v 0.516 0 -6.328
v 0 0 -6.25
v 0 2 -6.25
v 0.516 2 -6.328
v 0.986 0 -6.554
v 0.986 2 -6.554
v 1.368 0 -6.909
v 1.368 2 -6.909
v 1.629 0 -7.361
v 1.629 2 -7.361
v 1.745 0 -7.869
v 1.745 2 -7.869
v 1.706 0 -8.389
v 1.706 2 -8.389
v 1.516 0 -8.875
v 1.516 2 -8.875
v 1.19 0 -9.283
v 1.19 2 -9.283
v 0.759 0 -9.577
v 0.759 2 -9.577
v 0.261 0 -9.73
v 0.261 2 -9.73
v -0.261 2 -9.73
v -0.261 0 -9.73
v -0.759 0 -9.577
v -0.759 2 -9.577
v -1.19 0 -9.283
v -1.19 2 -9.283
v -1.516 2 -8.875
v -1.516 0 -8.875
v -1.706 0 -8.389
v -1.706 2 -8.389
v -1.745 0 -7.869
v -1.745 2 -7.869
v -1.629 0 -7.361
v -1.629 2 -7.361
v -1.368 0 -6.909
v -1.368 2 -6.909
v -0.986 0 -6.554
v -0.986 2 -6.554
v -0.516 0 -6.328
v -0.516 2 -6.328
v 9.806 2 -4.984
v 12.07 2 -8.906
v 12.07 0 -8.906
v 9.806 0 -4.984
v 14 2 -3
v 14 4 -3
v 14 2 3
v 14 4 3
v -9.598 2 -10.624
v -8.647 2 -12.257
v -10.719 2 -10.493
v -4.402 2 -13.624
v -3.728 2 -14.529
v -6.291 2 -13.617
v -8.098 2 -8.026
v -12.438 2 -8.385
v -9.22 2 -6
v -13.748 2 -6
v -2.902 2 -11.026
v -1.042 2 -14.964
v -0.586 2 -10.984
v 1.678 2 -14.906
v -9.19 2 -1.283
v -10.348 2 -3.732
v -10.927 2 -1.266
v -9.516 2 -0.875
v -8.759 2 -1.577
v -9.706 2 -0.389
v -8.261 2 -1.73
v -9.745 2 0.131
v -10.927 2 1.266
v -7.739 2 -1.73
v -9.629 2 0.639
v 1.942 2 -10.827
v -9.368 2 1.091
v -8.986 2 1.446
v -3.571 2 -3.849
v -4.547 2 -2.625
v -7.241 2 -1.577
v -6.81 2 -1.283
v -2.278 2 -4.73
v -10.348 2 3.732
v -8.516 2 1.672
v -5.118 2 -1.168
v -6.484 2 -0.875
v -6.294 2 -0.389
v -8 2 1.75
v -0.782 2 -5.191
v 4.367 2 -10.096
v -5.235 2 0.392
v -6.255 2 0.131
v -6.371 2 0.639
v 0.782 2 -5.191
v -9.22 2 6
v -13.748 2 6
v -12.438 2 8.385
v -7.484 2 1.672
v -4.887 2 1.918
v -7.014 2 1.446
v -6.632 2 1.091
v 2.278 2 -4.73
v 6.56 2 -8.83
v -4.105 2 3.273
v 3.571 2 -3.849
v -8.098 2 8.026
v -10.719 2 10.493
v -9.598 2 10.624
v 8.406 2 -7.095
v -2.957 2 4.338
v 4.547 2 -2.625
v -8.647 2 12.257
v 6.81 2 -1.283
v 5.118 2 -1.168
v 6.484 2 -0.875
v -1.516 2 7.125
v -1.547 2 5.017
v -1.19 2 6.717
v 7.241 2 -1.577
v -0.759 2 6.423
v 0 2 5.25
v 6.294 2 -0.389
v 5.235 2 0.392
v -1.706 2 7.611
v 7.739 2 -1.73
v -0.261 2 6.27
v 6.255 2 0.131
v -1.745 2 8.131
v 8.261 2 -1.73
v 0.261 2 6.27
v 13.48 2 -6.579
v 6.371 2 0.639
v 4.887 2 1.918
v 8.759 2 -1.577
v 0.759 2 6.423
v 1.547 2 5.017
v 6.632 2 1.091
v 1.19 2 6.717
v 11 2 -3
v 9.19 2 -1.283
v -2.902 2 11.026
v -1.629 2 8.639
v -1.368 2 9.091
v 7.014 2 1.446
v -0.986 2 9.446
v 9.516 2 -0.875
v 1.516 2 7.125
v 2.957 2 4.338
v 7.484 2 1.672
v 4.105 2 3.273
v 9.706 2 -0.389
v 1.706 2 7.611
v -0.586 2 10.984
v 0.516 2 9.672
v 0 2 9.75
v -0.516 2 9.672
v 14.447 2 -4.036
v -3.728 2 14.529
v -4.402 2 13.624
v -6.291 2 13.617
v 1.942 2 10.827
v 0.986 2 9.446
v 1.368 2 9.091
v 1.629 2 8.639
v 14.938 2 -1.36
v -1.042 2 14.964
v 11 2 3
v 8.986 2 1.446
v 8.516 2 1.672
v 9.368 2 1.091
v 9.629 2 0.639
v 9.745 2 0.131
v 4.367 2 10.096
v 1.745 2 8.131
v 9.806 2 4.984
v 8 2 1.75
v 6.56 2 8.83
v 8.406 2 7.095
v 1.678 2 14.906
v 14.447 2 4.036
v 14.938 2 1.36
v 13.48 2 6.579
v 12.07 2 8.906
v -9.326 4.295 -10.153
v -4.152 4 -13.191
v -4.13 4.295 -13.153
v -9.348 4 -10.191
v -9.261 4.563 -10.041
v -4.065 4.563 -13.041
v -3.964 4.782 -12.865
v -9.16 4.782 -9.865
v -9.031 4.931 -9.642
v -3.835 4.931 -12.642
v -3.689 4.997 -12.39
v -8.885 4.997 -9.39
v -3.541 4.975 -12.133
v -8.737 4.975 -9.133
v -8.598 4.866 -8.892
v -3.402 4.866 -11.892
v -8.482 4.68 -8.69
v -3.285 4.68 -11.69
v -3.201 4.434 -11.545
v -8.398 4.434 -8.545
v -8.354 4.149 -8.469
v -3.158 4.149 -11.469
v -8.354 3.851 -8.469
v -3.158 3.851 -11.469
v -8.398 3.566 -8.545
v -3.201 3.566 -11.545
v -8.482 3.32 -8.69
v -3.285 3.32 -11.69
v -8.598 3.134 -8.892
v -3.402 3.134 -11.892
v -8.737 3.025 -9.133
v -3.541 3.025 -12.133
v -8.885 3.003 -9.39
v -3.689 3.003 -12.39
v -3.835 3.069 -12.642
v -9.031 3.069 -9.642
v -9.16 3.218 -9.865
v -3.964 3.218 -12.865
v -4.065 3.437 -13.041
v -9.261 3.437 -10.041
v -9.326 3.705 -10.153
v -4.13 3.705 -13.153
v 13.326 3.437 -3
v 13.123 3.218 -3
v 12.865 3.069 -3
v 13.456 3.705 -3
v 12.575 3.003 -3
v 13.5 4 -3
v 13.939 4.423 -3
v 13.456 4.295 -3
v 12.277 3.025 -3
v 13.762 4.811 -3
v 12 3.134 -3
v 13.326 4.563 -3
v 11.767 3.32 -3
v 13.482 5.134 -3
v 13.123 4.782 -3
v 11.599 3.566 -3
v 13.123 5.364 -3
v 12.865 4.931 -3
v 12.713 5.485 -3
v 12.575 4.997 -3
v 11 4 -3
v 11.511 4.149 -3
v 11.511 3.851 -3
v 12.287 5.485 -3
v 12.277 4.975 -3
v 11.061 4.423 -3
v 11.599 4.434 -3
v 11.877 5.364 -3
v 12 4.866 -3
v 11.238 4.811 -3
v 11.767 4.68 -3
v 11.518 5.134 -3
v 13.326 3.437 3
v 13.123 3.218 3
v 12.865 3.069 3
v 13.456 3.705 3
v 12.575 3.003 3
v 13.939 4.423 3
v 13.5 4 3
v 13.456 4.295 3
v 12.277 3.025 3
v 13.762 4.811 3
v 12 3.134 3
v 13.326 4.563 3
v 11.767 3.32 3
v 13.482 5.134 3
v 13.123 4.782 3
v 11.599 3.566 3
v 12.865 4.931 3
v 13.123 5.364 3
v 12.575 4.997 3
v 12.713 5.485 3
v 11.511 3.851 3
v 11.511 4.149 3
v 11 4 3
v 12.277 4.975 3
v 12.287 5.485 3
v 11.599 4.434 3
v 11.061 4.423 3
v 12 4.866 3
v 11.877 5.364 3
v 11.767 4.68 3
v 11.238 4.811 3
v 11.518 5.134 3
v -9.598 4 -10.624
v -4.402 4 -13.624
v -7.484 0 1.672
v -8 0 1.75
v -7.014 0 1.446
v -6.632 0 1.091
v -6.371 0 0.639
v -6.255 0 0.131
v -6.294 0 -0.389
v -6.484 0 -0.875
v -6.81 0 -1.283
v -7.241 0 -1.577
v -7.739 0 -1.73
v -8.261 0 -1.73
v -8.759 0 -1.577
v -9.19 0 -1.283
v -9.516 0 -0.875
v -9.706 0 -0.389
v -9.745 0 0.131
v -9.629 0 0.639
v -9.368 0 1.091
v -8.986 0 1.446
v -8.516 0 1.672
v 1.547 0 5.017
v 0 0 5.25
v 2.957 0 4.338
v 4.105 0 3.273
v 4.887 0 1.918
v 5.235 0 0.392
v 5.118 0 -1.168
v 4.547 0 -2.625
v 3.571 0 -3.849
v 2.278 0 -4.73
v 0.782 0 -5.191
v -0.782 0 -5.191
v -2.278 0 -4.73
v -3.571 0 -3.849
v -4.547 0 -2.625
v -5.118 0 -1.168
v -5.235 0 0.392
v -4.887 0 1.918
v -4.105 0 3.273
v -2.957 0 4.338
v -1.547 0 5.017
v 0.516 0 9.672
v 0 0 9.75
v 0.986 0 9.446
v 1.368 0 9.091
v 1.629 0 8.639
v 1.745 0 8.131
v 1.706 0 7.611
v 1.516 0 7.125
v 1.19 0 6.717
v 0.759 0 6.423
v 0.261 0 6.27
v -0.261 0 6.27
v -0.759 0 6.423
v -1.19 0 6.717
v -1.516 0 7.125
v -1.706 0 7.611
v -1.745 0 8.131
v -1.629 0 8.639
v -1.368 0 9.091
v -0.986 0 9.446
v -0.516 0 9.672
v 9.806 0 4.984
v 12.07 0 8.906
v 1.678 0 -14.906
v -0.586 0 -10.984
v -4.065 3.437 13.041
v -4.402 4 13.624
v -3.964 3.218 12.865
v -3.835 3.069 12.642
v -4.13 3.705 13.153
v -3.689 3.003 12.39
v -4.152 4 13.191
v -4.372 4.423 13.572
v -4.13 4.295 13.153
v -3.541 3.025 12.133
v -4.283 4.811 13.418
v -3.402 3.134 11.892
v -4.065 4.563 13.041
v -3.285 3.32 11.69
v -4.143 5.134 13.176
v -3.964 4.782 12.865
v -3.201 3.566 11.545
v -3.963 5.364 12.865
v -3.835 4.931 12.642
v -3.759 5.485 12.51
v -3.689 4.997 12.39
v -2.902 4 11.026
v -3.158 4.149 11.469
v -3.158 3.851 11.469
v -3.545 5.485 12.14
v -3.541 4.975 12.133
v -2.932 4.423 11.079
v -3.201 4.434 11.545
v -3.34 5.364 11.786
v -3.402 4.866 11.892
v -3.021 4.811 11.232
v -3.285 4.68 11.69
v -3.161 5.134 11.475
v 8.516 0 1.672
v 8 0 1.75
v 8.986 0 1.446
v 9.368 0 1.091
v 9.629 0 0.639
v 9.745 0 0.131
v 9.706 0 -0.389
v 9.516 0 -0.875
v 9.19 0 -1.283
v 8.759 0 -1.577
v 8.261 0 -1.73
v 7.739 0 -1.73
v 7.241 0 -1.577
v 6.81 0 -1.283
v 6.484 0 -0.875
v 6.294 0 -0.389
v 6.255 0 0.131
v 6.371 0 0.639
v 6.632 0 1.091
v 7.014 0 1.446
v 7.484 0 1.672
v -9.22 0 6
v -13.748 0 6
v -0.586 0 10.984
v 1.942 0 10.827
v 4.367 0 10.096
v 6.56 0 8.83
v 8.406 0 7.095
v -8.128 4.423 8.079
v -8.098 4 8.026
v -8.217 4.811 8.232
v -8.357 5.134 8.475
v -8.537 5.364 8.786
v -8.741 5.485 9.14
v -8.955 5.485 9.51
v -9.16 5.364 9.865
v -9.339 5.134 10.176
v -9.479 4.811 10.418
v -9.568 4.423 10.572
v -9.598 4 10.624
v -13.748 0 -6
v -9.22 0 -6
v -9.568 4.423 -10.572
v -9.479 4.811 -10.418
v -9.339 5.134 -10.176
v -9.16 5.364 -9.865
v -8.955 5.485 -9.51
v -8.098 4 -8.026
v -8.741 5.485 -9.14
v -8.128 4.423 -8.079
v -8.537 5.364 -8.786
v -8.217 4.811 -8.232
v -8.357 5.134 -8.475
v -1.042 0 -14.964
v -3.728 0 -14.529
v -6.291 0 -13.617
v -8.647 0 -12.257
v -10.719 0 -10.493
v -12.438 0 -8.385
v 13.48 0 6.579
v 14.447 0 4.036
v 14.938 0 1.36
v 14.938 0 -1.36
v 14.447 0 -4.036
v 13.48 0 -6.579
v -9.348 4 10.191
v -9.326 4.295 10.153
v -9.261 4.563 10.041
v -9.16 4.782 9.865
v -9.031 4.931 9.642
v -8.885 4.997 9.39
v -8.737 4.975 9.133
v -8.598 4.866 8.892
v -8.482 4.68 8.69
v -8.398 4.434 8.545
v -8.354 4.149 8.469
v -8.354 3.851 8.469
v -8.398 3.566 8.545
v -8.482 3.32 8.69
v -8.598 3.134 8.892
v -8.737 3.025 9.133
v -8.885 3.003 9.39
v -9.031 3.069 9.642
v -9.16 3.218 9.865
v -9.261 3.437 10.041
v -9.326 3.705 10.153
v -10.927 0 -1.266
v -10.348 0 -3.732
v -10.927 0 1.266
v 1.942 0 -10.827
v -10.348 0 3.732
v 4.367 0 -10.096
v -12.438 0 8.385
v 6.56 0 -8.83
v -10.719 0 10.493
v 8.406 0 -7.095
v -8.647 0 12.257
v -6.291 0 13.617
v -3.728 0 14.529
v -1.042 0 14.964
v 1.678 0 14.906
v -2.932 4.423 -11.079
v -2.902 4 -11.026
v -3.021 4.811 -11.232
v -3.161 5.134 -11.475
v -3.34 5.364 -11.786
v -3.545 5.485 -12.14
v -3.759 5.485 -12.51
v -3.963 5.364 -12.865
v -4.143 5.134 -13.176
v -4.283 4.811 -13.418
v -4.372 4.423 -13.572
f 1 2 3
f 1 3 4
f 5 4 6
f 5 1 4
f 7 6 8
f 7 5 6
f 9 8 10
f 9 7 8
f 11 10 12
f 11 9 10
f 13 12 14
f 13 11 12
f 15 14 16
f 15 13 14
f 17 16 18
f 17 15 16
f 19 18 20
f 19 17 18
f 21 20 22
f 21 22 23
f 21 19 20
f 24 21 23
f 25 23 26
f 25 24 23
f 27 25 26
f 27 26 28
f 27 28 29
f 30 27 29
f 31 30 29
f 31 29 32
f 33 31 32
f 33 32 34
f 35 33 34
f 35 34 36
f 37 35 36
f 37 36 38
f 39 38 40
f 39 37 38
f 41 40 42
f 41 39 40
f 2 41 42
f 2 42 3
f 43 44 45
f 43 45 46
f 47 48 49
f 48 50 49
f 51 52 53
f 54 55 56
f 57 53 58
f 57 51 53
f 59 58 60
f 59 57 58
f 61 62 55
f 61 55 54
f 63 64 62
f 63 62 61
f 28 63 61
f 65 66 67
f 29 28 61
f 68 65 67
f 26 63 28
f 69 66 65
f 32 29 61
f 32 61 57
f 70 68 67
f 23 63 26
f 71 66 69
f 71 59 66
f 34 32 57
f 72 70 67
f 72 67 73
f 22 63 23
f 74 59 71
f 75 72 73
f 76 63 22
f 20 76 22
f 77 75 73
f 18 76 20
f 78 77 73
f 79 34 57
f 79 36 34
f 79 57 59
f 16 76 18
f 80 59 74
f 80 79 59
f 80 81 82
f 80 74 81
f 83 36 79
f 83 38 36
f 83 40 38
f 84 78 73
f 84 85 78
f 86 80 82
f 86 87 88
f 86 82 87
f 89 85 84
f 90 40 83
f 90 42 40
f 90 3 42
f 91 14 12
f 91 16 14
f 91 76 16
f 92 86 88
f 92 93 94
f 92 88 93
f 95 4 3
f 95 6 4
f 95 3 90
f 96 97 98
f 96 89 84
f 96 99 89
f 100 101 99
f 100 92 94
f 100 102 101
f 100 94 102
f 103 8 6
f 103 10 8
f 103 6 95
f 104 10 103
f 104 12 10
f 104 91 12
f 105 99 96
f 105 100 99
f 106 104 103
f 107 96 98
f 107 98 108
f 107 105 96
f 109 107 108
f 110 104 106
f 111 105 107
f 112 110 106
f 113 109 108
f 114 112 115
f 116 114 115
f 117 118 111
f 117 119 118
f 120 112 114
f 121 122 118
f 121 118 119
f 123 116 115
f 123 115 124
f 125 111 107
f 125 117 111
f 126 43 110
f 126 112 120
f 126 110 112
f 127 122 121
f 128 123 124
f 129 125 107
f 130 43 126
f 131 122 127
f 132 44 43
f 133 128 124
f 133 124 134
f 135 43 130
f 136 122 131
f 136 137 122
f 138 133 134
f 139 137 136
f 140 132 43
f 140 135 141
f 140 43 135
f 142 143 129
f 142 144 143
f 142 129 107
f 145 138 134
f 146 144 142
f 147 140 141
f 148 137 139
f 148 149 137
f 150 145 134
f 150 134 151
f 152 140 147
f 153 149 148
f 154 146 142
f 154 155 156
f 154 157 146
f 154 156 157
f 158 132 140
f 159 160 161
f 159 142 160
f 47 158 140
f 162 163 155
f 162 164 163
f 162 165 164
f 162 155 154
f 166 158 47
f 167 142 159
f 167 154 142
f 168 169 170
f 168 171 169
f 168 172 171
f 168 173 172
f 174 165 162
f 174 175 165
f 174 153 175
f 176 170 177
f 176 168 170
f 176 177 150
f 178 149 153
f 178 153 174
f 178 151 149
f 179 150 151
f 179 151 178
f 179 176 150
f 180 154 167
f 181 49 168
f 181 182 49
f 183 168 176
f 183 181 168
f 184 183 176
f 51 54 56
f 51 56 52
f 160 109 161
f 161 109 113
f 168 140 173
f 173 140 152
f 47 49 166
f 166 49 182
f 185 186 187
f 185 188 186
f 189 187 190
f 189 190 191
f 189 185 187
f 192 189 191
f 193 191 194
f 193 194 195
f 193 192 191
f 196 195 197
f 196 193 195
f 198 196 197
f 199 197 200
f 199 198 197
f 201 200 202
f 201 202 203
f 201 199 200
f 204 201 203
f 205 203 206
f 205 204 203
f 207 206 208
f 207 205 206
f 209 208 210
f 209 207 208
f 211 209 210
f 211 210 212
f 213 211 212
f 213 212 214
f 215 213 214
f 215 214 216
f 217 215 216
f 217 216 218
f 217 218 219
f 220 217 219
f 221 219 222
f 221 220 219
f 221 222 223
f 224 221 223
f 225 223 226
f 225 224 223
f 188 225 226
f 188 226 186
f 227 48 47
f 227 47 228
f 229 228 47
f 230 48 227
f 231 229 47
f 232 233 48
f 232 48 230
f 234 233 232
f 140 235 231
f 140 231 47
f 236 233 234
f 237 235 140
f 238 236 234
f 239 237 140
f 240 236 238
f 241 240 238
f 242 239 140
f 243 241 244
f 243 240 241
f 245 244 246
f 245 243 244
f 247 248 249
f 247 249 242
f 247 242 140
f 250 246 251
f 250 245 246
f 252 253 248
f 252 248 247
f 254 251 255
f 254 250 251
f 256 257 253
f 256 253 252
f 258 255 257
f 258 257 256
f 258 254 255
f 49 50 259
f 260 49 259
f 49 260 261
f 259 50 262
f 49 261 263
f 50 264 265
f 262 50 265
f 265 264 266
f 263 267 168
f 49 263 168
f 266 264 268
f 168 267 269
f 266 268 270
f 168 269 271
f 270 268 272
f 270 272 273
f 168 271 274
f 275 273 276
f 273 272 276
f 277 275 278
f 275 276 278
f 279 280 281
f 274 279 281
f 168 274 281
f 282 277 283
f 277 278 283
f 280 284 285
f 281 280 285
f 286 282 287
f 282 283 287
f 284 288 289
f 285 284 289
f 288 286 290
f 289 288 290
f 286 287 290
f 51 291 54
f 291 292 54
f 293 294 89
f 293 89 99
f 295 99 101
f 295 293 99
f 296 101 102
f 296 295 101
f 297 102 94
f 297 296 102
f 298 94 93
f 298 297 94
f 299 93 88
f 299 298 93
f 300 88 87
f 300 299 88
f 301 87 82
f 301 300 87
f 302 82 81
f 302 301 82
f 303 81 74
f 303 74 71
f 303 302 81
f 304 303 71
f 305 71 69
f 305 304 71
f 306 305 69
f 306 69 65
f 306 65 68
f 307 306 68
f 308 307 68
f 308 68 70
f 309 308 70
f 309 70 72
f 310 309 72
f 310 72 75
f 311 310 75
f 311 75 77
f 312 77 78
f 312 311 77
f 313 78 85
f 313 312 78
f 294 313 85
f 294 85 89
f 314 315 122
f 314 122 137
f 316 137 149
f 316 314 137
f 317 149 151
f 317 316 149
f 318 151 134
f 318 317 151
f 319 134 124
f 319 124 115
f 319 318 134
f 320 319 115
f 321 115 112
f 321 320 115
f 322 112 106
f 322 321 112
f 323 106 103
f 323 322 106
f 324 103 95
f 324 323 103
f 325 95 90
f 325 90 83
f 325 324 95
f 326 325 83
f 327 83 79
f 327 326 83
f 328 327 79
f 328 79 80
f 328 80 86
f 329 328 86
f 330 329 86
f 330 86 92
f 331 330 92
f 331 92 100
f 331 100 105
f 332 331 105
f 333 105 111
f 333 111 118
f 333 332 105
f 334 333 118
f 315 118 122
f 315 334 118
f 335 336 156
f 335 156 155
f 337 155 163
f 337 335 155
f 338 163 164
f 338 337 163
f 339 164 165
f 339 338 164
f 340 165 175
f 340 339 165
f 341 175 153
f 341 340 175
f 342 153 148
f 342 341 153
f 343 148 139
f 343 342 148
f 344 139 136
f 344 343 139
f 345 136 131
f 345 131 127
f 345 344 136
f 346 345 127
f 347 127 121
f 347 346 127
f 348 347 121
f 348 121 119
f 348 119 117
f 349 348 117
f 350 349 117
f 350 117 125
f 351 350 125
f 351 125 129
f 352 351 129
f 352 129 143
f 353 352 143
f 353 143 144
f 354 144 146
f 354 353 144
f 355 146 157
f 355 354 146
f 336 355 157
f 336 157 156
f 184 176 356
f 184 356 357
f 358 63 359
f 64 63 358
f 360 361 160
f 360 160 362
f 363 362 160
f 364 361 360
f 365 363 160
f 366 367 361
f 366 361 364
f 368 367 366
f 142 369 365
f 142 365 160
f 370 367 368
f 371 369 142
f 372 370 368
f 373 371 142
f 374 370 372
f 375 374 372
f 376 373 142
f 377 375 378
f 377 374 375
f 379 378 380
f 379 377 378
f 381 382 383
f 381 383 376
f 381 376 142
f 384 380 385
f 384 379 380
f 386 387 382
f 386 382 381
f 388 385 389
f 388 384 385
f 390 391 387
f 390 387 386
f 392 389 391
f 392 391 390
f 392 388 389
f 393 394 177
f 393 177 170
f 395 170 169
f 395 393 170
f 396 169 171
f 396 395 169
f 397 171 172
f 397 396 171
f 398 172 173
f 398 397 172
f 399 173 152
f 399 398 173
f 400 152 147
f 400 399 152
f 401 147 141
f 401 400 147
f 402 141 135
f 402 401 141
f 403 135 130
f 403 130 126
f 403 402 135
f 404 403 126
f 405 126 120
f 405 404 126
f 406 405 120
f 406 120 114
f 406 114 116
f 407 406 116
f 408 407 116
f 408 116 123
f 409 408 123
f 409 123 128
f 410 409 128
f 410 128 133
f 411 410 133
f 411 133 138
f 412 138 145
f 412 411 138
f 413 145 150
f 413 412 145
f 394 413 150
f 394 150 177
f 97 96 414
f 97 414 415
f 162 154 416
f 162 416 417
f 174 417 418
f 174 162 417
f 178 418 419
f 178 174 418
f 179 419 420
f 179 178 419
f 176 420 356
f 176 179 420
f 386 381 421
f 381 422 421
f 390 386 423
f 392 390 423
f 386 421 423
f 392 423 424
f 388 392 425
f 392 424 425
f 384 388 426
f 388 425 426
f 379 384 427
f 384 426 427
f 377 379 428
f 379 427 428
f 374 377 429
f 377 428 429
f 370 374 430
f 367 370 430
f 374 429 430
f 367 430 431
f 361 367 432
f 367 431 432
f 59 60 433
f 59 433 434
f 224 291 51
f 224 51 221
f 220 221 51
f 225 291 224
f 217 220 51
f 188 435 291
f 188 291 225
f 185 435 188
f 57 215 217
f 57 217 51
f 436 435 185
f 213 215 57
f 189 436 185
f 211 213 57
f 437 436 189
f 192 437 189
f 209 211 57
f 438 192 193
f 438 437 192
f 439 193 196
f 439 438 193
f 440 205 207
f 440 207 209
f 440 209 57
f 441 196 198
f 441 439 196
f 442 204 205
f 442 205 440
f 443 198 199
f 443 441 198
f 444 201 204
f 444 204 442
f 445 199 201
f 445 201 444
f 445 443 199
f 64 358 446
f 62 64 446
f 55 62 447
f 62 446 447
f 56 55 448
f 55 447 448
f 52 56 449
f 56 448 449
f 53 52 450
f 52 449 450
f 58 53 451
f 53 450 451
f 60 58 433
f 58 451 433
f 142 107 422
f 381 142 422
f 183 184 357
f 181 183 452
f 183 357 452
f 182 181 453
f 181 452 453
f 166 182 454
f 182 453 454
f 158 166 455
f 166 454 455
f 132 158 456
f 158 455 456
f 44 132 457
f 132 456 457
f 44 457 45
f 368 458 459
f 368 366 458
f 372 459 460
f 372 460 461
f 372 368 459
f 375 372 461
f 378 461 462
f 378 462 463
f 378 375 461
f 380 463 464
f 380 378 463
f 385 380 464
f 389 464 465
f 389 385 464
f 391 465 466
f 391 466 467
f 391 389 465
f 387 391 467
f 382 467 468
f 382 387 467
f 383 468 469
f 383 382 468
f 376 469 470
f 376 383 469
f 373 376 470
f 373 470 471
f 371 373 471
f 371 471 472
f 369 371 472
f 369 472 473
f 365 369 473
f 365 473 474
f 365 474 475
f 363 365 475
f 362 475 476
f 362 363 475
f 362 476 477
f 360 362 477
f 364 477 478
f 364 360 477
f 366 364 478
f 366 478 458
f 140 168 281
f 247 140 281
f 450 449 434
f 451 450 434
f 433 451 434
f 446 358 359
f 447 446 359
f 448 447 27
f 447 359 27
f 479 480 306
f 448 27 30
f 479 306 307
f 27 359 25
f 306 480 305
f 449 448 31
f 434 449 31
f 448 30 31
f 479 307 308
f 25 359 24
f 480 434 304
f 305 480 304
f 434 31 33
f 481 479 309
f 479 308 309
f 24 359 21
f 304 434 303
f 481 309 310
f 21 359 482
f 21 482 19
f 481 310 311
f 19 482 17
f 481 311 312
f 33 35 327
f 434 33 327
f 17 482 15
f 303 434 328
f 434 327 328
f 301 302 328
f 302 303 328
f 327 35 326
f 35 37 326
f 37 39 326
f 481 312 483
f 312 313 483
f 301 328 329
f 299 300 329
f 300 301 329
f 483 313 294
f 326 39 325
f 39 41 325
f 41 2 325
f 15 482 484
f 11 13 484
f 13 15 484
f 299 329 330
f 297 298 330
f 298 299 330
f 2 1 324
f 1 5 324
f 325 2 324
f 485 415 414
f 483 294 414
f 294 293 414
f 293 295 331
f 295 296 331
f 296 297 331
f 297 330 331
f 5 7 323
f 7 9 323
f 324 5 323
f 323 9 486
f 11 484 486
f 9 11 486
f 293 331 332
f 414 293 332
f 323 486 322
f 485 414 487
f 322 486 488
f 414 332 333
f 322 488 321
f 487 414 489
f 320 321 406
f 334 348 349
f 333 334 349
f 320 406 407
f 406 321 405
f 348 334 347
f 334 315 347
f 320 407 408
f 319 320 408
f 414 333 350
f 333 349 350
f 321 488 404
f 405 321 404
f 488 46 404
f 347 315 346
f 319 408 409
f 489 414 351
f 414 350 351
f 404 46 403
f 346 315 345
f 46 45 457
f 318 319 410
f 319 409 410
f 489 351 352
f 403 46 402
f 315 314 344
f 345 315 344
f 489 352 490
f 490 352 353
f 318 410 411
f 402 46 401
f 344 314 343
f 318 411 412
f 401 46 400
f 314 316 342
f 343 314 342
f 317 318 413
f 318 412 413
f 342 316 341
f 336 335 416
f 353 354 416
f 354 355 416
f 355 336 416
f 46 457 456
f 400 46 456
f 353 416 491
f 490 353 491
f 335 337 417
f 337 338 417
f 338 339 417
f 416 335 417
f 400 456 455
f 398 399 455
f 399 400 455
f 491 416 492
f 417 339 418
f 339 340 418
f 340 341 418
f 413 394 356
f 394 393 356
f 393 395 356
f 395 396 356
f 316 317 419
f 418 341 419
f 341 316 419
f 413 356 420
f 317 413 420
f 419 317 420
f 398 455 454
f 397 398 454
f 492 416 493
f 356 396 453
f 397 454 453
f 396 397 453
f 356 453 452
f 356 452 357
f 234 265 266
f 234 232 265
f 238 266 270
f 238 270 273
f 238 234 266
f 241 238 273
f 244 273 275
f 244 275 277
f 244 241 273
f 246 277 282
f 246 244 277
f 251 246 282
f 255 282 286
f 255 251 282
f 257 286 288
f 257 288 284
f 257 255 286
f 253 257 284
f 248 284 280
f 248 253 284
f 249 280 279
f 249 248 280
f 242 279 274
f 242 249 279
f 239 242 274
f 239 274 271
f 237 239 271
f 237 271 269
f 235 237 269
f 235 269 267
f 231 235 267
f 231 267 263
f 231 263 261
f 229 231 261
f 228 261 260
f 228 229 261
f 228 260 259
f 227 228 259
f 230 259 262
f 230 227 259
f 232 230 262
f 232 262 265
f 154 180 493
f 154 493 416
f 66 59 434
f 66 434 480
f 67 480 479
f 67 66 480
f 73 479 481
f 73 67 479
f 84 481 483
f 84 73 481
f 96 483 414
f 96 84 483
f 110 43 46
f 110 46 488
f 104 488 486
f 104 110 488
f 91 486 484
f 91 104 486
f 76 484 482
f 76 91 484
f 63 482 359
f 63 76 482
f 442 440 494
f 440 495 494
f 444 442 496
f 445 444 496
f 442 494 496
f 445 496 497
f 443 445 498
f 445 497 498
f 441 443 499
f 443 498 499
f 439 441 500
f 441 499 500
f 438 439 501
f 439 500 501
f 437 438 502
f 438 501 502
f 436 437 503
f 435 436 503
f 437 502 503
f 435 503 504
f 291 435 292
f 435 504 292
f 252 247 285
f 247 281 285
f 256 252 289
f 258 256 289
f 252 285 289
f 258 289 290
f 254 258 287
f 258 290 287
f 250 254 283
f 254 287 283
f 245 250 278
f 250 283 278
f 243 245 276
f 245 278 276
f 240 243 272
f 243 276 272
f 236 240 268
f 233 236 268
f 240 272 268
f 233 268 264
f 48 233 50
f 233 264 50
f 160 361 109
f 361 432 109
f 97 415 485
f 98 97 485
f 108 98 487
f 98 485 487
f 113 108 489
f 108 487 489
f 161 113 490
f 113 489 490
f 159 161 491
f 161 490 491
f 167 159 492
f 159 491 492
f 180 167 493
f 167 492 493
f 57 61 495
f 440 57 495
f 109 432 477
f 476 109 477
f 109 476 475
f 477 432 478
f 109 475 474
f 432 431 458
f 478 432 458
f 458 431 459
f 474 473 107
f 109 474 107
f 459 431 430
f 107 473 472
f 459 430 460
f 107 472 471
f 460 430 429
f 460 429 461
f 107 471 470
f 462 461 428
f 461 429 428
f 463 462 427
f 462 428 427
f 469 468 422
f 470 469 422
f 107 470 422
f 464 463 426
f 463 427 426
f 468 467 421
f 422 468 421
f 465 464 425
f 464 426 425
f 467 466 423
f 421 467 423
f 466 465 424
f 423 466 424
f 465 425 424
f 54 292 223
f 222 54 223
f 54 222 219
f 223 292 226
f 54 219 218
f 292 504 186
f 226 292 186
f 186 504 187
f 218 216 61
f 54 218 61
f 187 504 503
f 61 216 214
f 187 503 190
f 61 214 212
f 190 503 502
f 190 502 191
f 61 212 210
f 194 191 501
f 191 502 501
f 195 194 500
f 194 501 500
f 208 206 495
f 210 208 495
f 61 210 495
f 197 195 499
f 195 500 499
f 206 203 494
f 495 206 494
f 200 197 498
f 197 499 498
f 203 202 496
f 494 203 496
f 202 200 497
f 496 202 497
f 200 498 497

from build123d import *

# Parameters (mm, degrees)
SKETCH1_R           = 15
SKETCH1_R_2         = 5.25
SKETCH1_R_3         = 1.75
BOSS_EXTRUDE1_DEPTH = 2
SKETCH2_R           = 1
BOSS_EXTRUDE2_DEPTH = 3
CIRPATTERN1_COUNT   = 3
SKETCH3_OUTSIDE_W   = 40.556
SKETCH3_OUTSIDE_H   = 40.556
CUT_EXTRUDE1_DEPTH  = 10


with BuildPart() as part:
    # Sketch1 → Boss-Extrude1 (new body)
    with BuildSketch(Plane(origin=(0, 0, 0), x_dir=(1, 0, 0), z_dir=(0, 1, 0))):
        with Locations(Location((0, 0, 0), (0, 0, 270))):
            Circle(SKETCH1_R)
        with Locations(Location((0, 0, 0), (0, 0, 270))):
            Circle(SKETCH1_R_2, mode=Mode.SUBTRACT)
        with Locations(Location((0, 8, 0), (0, 0, 270))):
            Circle(SKETCH1_R_3, mode=Mode.SUBTRACT)
        with Locations(Location((8, 0, 0), (0, 0, 270))):
            Circle(SKETCH1_R_3, mode=Mode.SUBTRACT)
        with Locations(Location((0, -8, 0), (0, 0, 270))):
            Circle(SKETCH1_R_3, mode=Mode.SUBTRACT)
        with Locations(Location((-8, 0, 0), (0, 0, 270))):
            Circle(SKETCH1_R_3, mode=Mode.SUBTRACT)
    extrude(amount=BOSS_EXTRUDE1_DEPTH)

    # Sketch2 → Boss-Extrude2 (add, symmetric)
    with BuildSketch(Plane.XY):
        with BuildLine():
            Line((11, 2), (11, 4))
            ThreePointArc((11, 4), (12.5, 5.5), (14, 4))
            Line((14, 4), (14, 2))
            Line((14, 2), (11, 2))
        make_face()
        with Locations((12.5, 4)):
            Circle(SKETCH2_R, mode=Mode.SUBTRACT)
    boss_extrude2 = extrude(amount=BOSS_EXTRUDE2_DEPTH, both=True)

    # CirPattern1: Boss-Extrude2 ×3 about axis
    cirpattern1_axis = Axis((0, 0, 0), (0, 1, 0))
    for i in range(1, CIRPATTERN1_COUNT):
        add(boss_extrude2.rotate(cirpattern1_axis, i * 360 / CIRPATTERN1_COUNT))

    # Sketch3 outside → Cut-Extrude1 (cut)
    with BuildSketch(Plane(origin=(0, 2, 0), x_dir=(1, 0, 0), z_dir=(0, 1, 0))):
        Rectangle(SKETCH3_OUTSIDE_W, SKETCH3_OUTSIDE_H)
        with BuildLine():
            Line((1.67771112, -14.9058809), (-0.586380194, -10.984359711))
            ThreePointArc((-0.586380194, -10.984359711), (5.5, -9.526279442), (9.805924651, -4.984359711))
            Line((9.805924651, -4.984359711), (12.070015965, -8.9058809))
            ThreePointArc((12.070015965, -8.9058809), (15, 0), (12.070015965, 8.9058809))
            Line((12.070015965, 8.9058809), (9.805924651, 4.984359711))
            ThreePointArc((9.805924651, 4.984359711), (5.5, 9.526279442), (-0.586380194, 10.984359711))
            Line((-0.586380194, 10.984359711), (1.67771112, 14.9058809))
            ThreePointArc((1.67771112, 14.9058809), (-7.5, 12.990381057), (-13.747727085, 6))
            Line((-13.747727085, 6), (-9.219544457, 6))
            ThreePointArc((-9.219544457, 6), (-11, 0), (-9.219544457, -6))
            Line((-9.219544457, -6), (-13.747727085, -6))
            ThreePointArc((-13.747727085, -6), (-7.5, -12.990381057), (1.67771112, -14.9058809))
        make_face(mode=Mode.SUBTRACT)
    extrude(amount=-CUT_EXTRUDE1_DEPTH, mode=Mode.SUBTRACT)


solid = part.part
